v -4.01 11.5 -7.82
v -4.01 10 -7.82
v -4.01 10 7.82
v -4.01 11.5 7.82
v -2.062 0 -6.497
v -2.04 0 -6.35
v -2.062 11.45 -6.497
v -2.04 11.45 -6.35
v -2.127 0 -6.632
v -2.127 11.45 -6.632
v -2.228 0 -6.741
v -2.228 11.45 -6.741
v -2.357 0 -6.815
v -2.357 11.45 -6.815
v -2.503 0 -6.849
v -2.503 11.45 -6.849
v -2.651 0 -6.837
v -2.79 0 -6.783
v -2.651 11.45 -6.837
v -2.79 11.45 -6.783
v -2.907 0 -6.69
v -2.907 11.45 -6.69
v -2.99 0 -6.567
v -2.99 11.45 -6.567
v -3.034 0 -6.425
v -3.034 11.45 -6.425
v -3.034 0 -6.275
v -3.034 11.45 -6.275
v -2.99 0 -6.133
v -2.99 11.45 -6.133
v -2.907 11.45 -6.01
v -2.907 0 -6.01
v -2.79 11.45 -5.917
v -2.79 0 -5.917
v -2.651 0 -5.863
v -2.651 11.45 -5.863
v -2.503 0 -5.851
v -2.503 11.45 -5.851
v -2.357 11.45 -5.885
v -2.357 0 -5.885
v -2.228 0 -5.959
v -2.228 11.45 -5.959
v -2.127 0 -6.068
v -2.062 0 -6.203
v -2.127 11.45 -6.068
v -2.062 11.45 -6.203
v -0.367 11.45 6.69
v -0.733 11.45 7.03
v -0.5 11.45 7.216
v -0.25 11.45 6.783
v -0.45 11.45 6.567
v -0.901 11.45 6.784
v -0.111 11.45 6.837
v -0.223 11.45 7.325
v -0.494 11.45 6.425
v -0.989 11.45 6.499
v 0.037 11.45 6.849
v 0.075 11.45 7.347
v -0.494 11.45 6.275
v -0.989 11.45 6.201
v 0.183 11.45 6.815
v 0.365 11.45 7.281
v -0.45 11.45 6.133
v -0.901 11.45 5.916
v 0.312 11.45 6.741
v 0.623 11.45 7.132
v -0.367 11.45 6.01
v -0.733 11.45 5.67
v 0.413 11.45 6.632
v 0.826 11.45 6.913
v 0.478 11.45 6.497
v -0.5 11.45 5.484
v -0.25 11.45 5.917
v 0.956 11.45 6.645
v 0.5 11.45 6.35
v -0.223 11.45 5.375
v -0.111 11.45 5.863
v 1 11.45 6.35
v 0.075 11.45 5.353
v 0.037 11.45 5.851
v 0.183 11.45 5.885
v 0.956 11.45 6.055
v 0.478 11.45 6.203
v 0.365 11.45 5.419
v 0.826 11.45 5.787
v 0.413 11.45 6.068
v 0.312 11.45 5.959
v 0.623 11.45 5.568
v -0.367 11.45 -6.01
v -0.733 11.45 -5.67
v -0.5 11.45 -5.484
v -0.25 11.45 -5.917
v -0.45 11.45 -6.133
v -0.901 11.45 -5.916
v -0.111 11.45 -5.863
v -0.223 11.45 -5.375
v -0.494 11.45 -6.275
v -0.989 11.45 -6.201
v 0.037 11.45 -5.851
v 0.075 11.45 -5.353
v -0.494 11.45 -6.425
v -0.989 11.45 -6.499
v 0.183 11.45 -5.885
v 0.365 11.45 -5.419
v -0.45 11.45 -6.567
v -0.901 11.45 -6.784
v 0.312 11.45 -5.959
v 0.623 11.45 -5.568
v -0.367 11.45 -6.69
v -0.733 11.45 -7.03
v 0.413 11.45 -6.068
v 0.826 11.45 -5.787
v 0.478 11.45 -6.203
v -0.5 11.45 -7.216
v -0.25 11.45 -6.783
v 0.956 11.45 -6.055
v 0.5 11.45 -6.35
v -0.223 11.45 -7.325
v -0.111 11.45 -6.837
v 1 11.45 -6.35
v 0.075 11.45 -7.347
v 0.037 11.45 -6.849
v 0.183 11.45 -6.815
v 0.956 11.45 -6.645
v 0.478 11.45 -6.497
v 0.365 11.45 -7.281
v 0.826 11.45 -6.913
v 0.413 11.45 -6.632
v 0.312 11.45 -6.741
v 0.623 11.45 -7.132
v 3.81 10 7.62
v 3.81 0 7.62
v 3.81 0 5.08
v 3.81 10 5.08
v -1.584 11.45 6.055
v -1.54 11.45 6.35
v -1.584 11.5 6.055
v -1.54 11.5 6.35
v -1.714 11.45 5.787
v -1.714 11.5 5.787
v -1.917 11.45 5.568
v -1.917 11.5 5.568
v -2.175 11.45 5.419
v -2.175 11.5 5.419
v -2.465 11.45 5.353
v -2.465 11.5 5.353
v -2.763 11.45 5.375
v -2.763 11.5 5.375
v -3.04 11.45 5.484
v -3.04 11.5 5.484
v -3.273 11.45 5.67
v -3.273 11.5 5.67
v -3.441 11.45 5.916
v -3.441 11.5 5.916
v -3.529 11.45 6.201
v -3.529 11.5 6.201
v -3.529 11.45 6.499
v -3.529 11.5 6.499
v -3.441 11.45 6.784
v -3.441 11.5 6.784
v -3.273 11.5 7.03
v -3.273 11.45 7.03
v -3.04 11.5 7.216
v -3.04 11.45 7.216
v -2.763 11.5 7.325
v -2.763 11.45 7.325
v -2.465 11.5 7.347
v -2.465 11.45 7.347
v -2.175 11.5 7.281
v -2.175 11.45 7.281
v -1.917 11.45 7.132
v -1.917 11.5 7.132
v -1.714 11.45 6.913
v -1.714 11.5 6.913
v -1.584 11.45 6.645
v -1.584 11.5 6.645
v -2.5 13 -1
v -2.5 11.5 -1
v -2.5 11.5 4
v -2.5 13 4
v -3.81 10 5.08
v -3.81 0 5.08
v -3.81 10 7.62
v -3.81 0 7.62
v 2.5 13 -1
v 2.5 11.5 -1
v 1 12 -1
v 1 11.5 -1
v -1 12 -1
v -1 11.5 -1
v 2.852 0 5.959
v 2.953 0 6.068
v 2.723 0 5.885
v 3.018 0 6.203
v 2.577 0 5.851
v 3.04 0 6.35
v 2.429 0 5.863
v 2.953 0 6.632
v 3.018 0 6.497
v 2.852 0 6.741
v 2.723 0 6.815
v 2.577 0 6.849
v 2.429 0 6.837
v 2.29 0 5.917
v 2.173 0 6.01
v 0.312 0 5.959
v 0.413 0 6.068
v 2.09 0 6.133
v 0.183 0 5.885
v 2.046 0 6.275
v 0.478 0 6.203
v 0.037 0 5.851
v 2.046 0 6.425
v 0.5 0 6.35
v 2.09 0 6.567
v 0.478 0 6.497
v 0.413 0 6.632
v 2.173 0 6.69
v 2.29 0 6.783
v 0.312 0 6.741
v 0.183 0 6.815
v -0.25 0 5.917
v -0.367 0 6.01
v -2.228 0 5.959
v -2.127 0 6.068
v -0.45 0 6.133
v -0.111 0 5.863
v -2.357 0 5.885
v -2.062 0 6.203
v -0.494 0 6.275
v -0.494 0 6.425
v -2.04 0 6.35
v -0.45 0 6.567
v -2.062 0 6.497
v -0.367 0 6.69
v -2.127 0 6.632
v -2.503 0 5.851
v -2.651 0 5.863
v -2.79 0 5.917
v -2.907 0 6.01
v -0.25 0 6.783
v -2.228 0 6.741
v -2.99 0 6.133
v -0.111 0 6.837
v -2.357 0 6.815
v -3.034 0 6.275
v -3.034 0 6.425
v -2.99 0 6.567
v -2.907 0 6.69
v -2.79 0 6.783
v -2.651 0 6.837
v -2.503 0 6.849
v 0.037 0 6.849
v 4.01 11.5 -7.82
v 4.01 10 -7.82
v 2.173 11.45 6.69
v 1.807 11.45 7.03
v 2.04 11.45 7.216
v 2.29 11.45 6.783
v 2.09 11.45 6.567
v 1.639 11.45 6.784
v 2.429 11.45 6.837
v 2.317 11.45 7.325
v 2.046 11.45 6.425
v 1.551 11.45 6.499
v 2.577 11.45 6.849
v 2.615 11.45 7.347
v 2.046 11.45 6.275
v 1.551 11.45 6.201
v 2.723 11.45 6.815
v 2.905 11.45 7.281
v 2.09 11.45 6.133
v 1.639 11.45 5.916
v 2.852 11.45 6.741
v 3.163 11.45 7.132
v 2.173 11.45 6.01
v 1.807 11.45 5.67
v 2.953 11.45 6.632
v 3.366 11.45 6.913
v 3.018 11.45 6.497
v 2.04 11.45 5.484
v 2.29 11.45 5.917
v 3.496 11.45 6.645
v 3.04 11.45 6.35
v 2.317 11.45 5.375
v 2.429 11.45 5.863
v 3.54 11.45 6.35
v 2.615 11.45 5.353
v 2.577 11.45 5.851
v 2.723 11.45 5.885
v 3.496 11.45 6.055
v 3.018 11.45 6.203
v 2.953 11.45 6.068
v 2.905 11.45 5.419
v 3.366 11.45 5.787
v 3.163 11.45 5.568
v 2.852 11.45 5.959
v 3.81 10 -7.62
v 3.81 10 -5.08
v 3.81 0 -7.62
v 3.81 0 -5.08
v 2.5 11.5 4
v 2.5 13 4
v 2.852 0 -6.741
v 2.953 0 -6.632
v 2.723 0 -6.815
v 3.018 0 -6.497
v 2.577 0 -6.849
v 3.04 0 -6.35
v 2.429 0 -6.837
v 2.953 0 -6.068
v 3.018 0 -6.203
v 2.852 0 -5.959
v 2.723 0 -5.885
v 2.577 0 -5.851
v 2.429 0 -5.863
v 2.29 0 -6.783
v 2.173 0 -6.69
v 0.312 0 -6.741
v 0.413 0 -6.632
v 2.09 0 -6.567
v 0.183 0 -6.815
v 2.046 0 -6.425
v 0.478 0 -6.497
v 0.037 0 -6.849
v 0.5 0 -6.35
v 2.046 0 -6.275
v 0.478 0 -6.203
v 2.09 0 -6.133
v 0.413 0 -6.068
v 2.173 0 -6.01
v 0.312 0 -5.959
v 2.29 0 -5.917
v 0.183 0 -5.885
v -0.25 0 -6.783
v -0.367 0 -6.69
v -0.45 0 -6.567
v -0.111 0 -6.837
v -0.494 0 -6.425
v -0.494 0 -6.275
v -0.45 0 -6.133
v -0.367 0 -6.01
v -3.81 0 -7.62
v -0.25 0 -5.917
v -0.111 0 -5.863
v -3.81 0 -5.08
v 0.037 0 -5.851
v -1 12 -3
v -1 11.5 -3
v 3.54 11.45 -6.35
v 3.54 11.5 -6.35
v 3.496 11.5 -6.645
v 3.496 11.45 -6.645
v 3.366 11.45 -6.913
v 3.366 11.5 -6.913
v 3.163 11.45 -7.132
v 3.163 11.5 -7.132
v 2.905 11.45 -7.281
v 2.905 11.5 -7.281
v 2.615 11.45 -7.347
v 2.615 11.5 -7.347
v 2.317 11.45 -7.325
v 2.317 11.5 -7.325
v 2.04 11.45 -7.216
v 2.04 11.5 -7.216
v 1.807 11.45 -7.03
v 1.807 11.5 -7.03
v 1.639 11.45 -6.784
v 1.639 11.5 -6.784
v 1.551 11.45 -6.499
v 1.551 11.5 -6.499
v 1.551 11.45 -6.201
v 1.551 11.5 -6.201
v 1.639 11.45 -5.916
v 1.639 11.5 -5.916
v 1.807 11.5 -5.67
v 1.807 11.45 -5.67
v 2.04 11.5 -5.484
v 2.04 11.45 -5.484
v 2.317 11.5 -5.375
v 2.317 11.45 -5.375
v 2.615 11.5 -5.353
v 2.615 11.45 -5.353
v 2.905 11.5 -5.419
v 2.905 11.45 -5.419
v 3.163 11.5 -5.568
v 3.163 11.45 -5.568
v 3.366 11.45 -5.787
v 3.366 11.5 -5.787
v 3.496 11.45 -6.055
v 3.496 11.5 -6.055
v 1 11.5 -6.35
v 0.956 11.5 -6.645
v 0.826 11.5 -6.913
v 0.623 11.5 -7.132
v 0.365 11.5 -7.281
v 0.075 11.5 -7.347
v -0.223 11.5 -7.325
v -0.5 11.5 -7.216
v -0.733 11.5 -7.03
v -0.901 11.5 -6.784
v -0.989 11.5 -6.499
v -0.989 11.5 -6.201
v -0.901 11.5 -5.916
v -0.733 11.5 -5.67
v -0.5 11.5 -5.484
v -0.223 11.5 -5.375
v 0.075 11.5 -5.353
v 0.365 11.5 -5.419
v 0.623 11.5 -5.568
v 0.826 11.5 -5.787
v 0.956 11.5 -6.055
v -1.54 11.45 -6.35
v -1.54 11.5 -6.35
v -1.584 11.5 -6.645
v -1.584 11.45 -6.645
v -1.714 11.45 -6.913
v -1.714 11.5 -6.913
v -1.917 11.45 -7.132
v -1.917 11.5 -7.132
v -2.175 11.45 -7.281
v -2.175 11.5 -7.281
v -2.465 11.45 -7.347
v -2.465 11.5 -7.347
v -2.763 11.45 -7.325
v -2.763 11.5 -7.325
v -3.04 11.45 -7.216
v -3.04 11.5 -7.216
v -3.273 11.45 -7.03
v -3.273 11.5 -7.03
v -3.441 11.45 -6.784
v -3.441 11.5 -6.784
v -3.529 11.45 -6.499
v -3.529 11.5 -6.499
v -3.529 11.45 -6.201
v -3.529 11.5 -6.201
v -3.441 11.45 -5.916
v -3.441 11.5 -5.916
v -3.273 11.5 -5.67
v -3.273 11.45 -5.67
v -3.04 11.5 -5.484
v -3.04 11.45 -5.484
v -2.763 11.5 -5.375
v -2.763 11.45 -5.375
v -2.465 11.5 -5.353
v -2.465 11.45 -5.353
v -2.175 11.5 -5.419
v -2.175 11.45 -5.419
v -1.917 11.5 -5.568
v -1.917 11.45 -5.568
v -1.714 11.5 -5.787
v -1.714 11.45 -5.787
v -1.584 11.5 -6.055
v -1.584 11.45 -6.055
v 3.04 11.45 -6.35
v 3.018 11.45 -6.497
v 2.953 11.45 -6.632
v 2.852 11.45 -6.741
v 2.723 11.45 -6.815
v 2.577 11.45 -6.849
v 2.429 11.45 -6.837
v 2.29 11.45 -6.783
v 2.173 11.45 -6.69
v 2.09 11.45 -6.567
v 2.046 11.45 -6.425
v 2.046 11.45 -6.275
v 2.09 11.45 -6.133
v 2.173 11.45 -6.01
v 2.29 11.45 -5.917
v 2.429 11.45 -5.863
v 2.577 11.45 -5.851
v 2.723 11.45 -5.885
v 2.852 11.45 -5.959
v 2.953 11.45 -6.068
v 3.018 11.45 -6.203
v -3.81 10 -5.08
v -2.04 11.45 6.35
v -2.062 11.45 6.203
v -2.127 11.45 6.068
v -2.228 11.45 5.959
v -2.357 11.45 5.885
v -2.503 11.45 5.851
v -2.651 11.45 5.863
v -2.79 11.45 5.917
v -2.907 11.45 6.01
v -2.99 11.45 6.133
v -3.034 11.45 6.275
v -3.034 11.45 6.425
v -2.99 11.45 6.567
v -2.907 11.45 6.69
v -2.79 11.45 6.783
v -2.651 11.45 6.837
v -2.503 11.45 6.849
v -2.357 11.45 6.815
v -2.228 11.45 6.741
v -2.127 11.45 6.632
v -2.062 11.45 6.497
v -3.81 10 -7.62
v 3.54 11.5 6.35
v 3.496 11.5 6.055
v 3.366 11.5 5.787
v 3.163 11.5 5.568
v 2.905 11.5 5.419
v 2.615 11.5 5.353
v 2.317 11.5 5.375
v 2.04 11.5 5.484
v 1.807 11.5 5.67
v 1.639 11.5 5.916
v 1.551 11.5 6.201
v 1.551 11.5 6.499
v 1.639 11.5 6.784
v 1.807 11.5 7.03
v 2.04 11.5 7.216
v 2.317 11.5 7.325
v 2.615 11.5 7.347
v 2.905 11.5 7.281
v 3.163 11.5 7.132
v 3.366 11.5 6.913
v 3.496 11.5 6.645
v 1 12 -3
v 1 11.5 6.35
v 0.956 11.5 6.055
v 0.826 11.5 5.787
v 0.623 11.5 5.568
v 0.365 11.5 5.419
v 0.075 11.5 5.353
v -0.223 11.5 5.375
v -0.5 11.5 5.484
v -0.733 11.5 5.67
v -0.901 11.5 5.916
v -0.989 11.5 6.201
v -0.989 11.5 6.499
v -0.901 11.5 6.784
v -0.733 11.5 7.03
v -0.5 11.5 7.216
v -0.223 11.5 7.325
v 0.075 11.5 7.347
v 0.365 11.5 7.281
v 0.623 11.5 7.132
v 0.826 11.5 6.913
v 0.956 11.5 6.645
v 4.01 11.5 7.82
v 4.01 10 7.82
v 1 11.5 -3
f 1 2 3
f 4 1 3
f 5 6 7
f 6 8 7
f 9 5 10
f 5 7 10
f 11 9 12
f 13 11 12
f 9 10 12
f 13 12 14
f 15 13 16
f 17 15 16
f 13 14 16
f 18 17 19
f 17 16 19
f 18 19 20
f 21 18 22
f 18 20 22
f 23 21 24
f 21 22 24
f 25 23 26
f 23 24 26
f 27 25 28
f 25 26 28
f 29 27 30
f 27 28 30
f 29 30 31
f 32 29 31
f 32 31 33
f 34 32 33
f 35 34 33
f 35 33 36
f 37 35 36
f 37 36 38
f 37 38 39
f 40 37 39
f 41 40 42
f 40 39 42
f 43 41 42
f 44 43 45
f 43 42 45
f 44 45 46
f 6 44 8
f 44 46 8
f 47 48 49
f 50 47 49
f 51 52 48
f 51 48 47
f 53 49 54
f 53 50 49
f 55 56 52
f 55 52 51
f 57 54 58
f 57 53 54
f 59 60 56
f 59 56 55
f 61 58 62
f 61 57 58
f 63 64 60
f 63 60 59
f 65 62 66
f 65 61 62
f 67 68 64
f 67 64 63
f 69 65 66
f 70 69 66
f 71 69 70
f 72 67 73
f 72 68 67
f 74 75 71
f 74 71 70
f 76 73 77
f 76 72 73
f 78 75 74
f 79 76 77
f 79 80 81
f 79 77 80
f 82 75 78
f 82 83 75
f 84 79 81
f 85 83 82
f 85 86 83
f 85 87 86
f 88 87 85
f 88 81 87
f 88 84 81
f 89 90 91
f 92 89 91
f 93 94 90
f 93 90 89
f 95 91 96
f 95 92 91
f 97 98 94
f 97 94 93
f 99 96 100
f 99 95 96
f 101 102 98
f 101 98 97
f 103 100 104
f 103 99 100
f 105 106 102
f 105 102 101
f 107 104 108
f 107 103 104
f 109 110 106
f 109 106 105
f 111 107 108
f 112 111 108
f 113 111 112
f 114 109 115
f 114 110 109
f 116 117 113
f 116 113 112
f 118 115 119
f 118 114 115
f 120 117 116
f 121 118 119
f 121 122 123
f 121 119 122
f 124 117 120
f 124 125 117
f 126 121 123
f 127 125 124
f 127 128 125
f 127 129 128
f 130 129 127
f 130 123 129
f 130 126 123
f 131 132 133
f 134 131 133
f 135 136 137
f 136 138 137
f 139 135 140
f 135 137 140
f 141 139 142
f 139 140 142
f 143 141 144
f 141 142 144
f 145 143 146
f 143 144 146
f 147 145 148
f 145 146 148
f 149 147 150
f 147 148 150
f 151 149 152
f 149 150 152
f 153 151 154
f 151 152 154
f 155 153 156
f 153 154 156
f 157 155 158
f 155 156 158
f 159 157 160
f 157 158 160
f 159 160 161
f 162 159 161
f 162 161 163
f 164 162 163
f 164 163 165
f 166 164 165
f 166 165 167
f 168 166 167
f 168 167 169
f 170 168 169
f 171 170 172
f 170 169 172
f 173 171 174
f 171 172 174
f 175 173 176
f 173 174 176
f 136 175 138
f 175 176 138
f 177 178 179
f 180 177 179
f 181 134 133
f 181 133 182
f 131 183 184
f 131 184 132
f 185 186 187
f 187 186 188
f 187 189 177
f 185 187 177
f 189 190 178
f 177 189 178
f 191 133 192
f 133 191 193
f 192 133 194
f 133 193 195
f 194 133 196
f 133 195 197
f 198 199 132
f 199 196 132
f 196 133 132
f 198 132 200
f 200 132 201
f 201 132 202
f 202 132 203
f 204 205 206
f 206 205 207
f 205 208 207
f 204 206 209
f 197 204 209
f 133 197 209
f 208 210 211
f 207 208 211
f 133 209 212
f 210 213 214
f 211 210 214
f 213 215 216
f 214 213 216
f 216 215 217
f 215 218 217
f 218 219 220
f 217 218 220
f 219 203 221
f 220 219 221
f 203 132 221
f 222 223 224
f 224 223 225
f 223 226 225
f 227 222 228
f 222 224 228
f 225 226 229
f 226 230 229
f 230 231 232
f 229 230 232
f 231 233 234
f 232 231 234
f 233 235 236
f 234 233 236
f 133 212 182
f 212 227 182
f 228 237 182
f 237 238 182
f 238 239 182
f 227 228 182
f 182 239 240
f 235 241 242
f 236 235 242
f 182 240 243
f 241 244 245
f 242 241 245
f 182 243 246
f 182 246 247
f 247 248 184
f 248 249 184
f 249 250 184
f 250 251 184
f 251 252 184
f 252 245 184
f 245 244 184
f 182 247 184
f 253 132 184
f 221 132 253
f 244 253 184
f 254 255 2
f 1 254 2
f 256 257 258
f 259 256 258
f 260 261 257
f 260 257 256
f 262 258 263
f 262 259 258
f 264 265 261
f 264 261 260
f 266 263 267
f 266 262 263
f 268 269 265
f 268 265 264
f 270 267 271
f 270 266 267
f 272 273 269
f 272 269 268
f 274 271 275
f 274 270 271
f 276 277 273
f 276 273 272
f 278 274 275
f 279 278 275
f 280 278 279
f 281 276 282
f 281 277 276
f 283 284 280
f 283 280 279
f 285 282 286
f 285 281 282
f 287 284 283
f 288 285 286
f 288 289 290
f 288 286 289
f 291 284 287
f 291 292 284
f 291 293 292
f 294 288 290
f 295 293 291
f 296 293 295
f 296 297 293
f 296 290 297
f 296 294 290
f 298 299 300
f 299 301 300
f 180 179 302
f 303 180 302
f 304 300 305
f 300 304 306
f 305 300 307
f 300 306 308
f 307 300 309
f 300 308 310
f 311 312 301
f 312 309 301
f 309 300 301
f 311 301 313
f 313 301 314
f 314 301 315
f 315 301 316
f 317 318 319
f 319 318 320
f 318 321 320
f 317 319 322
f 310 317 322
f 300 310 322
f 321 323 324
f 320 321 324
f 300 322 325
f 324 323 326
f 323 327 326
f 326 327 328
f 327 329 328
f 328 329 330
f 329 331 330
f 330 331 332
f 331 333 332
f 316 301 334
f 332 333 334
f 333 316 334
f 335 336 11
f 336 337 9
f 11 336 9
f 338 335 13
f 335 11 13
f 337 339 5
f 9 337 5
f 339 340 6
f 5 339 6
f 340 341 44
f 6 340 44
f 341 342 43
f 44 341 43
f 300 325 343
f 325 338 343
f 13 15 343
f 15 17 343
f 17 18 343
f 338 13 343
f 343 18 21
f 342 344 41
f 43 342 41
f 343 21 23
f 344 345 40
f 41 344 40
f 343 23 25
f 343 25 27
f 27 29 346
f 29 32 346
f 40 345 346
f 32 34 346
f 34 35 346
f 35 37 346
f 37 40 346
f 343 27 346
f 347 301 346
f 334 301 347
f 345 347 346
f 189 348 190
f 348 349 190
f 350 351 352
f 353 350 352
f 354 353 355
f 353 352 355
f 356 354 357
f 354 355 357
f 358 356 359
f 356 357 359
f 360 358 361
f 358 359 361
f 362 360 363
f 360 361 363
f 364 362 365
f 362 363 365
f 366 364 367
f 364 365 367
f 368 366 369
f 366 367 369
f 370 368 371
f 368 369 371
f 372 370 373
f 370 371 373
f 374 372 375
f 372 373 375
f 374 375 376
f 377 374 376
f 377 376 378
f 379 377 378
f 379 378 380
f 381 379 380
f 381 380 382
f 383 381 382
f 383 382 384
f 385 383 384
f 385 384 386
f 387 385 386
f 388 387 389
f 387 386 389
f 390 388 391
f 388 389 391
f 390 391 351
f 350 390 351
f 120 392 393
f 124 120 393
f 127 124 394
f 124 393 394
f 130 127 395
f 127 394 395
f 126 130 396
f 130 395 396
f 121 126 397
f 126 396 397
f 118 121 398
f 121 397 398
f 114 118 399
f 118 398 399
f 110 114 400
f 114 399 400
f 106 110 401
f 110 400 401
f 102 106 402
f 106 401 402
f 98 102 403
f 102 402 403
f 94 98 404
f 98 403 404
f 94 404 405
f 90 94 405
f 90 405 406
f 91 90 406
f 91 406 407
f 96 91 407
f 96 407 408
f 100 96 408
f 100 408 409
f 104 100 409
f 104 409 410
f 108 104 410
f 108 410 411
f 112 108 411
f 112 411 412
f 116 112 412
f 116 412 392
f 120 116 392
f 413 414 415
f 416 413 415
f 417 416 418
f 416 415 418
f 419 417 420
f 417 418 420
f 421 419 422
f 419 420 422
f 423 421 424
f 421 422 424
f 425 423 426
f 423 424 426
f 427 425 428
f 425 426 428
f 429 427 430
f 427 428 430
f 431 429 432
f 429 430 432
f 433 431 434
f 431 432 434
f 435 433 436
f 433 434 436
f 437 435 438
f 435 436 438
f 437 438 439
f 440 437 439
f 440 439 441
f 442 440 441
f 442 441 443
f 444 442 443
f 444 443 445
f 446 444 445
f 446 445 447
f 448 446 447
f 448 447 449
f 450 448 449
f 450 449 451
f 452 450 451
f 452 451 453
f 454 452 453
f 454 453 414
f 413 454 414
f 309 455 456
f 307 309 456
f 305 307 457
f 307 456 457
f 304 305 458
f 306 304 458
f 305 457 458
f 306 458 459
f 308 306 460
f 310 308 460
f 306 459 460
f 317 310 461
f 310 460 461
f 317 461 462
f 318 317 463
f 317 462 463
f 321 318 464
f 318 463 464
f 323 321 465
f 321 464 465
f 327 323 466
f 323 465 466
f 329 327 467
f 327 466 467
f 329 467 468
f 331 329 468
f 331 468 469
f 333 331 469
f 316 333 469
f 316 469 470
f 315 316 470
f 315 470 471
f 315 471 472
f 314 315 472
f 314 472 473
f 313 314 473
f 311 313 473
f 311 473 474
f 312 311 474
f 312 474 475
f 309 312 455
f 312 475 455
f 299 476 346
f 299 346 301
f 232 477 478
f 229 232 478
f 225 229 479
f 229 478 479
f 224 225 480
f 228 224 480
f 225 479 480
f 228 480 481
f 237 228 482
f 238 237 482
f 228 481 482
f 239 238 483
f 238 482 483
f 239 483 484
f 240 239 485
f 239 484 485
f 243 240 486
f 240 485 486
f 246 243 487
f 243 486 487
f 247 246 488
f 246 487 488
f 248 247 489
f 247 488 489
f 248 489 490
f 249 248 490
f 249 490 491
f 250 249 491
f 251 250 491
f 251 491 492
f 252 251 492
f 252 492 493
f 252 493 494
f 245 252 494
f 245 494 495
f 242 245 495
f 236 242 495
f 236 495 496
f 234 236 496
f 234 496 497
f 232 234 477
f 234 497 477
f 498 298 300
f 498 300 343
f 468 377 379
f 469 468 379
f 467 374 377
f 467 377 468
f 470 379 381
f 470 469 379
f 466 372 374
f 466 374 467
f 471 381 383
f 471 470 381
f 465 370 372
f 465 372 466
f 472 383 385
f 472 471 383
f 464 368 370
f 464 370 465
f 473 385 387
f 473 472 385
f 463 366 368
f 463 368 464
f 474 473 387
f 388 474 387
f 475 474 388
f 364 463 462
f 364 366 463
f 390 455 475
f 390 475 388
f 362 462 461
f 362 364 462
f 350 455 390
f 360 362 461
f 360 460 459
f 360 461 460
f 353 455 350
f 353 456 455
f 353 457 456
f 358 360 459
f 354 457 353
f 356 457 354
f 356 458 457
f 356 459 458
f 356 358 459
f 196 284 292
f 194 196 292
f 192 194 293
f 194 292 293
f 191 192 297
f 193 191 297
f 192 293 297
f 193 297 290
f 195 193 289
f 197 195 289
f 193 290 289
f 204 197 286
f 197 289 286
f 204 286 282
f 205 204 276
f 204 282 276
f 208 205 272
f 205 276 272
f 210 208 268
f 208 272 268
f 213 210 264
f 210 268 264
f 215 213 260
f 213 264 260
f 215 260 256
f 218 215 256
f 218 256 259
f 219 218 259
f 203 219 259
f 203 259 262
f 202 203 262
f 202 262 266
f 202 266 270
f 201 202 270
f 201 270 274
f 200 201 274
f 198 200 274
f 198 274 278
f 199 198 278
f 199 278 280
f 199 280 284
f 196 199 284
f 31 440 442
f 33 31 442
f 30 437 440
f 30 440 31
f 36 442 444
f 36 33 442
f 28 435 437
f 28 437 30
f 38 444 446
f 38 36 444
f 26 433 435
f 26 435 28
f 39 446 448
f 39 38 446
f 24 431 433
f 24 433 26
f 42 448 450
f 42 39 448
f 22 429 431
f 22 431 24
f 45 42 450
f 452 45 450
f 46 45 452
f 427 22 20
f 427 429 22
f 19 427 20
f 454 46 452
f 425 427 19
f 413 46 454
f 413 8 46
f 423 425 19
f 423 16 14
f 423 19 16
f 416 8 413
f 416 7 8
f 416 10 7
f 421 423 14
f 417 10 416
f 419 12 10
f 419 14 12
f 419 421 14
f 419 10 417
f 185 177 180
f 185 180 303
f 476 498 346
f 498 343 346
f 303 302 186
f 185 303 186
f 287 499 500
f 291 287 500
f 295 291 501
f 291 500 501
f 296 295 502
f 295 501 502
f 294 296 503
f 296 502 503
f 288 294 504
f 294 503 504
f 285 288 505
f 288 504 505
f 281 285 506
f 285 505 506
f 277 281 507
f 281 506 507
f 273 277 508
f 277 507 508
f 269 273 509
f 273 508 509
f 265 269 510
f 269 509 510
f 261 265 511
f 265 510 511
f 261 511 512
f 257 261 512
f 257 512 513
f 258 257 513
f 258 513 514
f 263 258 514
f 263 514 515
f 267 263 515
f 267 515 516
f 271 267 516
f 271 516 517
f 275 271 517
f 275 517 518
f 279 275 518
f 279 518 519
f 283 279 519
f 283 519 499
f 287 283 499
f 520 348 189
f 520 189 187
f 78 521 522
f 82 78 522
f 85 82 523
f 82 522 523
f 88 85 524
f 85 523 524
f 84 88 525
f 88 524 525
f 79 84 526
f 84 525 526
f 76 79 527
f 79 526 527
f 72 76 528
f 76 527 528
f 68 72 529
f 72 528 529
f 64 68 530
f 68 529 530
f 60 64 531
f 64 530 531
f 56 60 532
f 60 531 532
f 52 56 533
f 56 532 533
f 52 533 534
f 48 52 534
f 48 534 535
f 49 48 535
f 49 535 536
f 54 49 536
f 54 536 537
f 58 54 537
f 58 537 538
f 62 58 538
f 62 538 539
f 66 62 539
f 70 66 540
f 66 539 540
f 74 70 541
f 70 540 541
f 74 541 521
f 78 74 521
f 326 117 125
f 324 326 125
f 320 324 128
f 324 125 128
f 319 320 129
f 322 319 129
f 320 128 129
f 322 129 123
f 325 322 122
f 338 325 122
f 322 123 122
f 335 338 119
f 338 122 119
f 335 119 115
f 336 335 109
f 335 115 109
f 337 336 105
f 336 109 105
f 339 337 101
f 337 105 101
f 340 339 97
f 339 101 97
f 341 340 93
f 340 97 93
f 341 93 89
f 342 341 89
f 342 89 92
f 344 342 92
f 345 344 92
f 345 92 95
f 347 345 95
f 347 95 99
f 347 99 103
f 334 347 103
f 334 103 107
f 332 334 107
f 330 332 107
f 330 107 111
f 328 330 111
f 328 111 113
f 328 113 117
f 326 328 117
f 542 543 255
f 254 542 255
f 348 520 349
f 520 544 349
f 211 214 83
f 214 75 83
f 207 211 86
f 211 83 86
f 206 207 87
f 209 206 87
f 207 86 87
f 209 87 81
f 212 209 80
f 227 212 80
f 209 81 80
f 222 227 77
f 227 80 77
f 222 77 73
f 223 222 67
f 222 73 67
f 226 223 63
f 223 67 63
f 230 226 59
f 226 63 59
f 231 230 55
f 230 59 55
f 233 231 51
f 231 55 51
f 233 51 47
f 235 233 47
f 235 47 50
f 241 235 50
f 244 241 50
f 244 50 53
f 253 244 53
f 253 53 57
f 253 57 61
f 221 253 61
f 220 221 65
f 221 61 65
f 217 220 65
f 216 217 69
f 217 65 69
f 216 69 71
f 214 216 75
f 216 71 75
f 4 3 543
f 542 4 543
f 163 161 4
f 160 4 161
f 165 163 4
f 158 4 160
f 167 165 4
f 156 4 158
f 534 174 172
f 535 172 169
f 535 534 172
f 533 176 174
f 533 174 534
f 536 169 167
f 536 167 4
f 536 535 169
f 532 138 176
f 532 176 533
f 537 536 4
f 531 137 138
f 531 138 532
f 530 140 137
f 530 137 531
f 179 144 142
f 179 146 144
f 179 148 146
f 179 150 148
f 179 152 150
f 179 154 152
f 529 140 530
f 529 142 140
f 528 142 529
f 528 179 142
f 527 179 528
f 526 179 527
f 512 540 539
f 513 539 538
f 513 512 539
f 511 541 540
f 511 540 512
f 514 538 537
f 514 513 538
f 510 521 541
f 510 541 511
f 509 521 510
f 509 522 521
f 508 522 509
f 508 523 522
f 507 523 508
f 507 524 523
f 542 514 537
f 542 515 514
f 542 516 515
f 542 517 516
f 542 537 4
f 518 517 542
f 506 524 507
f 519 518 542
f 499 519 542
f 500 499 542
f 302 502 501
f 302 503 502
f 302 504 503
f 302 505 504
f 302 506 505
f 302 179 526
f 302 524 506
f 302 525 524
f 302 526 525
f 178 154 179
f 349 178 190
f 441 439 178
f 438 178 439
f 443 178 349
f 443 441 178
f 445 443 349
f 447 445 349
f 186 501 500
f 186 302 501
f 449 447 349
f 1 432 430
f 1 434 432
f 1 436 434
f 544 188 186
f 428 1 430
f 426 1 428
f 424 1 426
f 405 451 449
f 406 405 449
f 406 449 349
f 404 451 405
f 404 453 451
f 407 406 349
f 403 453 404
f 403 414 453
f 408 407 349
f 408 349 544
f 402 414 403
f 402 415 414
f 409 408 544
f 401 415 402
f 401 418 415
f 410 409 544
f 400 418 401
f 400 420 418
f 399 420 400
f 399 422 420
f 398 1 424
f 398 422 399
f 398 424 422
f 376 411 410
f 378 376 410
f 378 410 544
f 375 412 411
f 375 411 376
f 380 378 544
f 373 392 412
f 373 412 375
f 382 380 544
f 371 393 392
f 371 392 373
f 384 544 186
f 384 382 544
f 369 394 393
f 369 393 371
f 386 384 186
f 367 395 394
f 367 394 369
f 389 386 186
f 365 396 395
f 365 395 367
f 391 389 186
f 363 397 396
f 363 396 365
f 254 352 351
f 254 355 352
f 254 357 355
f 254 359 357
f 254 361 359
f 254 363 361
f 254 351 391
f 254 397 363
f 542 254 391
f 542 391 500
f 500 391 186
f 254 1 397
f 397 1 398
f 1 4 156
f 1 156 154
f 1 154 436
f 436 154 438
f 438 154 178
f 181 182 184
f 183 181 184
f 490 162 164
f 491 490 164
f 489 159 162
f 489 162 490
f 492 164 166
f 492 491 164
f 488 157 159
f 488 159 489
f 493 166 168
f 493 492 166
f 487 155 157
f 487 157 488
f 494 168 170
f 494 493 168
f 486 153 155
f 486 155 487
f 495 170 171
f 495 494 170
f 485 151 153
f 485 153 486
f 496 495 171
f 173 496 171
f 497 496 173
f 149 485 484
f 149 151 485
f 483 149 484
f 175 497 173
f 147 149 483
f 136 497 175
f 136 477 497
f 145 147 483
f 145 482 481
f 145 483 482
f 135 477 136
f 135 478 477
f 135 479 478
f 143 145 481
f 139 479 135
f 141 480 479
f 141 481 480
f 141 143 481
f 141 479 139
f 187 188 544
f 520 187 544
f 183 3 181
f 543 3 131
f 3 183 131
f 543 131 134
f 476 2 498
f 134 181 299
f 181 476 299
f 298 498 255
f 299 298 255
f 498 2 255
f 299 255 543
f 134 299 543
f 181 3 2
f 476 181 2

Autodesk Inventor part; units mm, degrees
ref_plane "YZ Plane" through (0, 0, 0) normal (1, 0, 0) x (0, 1, 0)
ref_plane "XZ Plane" through (0, 0, 0) normal (0, 1, 0) x (-1, 0, 0)
ref_plane "XY Plane" through (0, 0, 0) normal (0, 0, 1) x (1, 0, 0)
sketch "スケッチ1" plane through (0, 0, 0) normal (0, 1, 0) x (-1, 0, 0)
  line L0 (3.81, -5.08) -> (-3.81, -5.08)
  line L1 (-3.81, -5.08) -> (-3.81, -7.62)
  line L2 (-3.81, -7.62) -> (3.81, -7.62)
  line L3 (3.81, -7.62) -> (3.81, -5.08)
  line L4 (3.81, 7.62) -> (-3.81, 7.62)
  line L5 (-3.81, 7.62) -> (-3.81, 5.08)
  line L6 (-3.81, 5.08) -> (3.81, 5.08)
  line L7 (3.81, 5.08) -> (3.81, 7.62)
  line L8 (5.334, 0) -> (-5.334, 0) projected
  point P0 (0, 0)
  point P1 (0, 7.62)
  point P2 (3.81, 6.35)
  point P3 (3.81, -6.35)
  point P4 (-5.334, 0)
  dimension "d0" = 7.62
  dimension "d1" = 2.54
  dimension "d2" = 12.7
extrude "押し出し1" add sketch "スケッチ1" along normal blind 10
sketch "スケッチ2" plane through (0, 10, 0) normal (0, 1, 0) x (1, 0, 0)
  line L0 (-4.01, -7.82) -> (4.01, -7.82)
  line L1 (4.01, -7.82) -> (4.01, 7.82)
  line L2 (4.01, 7.82) -> (-4.01, 7.82)
  line L3 (-4.01, 7.82) -> (-4.01, -7.82)
  line L4 (-3.81, -5.08) -> (-3.81, -7.62) projected
  line L5 (-3.81, -7.62) -> (3.81, -7.62) projected
  point P0 (0, 0)
  point P1 (0, -7.82)
  point P2 (-4.01, 0)
  dimension "d7" = 0.2
  dimension "d8" = 0.2
extrude "押し出し2" add sketch "スケッチ2" along normal blind 1.5
sketch "スケッチ3" plane through (0, 11.5, 0) normal (0, 1, 0) x (1, 0, 0)
  line L0 (3.81, -7.62) -> (3.81, -5.08) projected
  line L1 (-3.81, -7.62) -> (3.81, -7.62) projected
  line L2 (-3.81, -5.08) -> (-3.81, -7.62) projected
  line L3 (3.81, -5.08) -> (-3.81, -5.08) projected
  line L4 (3.81, 5.08) -> (3.81, 7.62) projected
  line L5 (-3.81, 5.08) -> (3.81, 5.08) projected
  line L6 (-3.81, 7.62) -> (-3.81, 5.08) projected
  line L7 (3.81, 7.62) -> (-3.81, 7.62) projected
  circle A0 centre (-2.54, -6.35) radius 1
  line L8 (-3.81, -5.08) -> (-3.81, -7.62) projected
  circle A1 centre (0, -6.35) radius 1
  circle A2 centre (2.54, -6.35) radius 1
  line L9 (-5.614, 0) -> (5.614, 0) projected
  circle A3 centre (-2.54, 6.35) radius 1
  line L10 (-3.81, 5.08) -> (-3.81, 7.62)
  circle A4 centre (0, 6.35) radius 1
  circle A5 centre (2.54, 6.35) radius 1
  circle A6 centre (-2.54, -6.35) radius 0.5
  circle A7 centre (0, -6.35) radius 0.5
  circle A8 centre (2.54, -6.35) radius 0.5
  circle A9 centre (-2.54, 6.35) radius 0.5
  circle A10 centre (0, 6.35) radius 0.5
  circle A11 centre (2.54, 6.35) radius 0.5
  line L11 (-2.5, -4) -> (2.5, -4)
  line L12 (2.5, -4) -> (2.5, 1)
  line L13 (2.5, 1) -> (-2.5, 1)
  line L14 (-2.5, 1) -> (-2.5, -4)
  line L15 (-1, 1) -> (1, 1)
  line L16 (1, 1) -> (1, 3)
  line L17 (1, 3) -> (-1, 3)
  line L18 (-1, 3) -> (-1, 1)
  point P0 (0.6683, -5.6061)
  point P1 (-3.81, -6.35)
  point P2 (-3.81, -6.35)
  point P3 (0, 0)
  point P4 (0.6683, 5.6061)
  point P5 (-3.81, 6.35)
  point P6 (-3.81, 6.35)
  point P7 (0, 1)
  point P8 (0, 3)
  dimension "d9" = 2
  dimension "d10" = 2.54
  dimension "d11" = 2.54
  dimension "d12" = 1
  dimension "d13" = 1
  dimension "d14" = 1
  dimension "d15" = 1
  dimension "d16" = 1
  dimension "d17" = 1
  dimension "d18" = 1
  dimension "d19" = 5
  dimension "d20" = 5
  dimension "d21" = 2
extrude "押し出し3" cut sketch "スケッチ3" against normal through all contours A6 | A7 | A8 | A9 | A10 | A11
extrude "押し出し4" cut sketch "スケッチ3" against normal blind 0.05 contours A0 | A1 | A2 | A3 | A4 | A5
extrude "押し出し5" add sketch "スケッチ3" along normal blind 1.5 contours L14 L13 L12 L9 | L9 L12 L11 L14
extrude "押し出し6" add sketch "スケッチ3" along normal blind 0.5 contours L18 L17 L16 L13
equation "\"d11\" = d10"
properties part number "TPS61230A"
